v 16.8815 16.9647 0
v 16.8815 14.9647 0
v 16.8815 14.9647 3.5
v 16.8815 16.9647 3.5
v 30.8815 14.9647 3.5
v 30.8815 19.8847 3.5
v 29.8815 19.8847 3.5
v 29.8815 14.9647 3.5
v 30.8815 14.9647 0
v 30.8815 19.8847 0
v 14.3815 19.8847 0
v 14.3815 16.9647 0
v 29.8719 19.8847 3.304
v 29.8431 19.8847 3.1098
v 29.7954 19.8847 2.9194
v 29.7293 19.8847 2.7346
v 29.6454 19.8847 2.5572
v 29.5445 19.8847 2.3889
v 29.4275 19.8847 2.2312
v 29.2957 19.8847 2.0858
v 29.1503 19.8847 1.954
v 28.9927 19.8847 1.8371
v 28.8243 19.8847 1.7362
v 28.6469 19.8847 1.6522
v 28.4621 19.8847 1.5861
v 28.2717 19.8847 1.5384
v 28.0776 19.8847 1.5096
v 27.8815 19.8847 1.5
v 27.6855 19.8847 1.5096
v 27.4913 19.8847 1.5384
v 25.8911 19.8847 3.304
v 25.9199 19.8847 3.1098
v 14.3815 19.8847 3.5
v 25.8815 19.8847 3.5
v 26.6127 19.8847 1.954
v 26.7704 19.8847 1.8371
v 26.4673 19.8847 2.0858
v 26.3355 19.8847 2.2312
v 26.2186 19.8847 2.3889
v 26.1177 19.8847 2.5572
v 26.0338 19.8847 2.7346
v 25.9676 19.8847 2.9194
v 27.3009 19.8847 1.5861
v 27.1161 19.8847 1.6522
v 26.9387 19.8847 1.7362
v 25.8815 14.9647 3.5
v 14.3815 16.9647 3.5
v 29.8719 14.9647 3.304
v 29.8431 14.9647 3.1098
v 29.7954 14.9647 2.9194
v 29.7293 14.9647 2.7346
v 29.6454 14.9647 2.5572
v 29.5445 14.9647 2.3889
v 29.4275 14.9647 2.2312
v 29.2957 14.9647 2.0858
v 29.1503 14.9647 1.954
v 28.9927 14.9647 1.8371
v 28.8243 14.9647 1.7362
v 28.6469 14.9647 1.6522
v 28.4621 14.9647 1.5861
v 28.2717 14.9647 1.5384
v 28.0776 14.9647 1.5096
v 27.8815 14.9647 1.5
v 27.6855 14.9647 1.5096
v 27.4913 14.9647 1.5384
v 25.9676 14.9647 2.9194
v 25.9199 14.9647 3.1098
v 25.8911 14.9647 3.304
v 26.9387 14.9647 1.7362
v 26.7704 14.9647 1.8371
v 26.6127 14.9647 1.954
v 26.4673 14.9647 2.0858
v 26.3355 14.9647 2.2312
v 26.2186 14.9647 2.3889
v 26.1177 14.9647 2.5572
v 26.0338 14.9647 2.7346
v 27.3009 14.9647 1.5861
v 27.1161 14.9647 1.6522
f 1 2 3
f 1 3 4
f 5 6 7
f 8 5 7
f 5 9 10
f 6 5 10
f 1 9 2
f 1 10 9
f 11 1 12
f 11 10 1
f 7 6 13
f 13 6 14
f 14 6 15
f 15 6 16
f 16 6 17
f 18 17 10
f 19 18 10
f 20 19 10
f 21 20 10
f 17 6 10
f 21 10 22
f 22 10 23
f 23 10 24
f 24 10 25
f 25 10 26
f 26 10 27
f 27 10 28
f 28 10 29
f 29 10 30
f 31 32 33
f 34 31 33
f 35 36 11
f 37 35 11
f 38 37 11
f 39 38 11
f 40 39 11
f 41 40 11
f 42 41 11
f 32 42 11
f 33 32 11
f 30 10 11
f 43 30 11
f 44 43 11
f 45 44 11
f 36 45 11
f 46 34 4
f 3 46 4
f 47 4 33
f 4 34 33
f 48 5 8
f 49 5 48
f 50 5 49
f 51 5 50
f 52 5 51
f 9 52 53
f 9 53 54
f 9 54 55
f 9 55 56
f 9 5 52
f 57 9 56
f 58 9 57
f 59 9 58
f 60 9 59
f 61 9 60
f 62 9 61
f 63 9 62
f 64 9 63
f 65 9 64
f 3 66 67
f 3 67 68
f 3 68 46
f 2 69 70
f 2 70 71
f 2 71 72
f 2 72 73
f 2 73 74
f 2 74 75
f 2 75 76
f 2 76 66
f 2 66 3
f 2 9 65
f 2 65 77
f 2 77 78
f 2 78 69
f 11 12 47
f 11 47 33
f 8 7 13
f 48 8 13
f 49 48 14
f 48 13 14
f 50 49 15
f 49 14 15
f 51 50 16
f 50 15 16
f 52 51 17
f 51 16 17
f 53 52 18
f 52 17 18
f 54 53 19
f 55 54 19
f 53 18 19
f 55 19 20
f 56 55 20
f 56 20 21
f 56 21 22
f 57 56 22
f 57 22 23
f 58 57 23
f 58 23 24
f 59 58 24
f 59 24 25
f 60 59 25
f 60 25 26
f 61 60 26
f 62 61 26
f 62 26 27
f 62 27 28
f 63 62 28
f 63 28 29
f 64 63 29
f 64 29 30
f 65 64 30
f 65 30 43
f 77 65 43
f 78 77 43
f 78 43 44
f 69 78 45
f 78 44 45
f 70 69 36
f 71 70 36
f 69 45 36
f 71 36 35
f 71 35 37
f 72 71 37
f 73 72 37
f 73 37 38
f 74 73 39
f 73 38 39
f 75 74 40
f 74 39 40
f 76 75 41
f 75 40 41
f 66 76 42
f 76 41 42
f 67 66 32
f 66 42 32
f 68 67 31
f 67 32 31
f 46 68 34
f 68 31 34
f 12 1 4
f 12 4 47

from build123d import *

# Parameters (mm, degrees)
BOSS_EXTRUDE2_DEPTH = 3.5
CUT_EXTRUDE1_DEPTH  = 6


with BuildPart() as part:
    # Sketch4 → Boss-Extrude2 (new body)
    with BuildSketch(Plane.XY):
        Polygon((30.881516436, 14.964687786), (16.881516436, 14.964687786), (16.881516436, 16.964687786), (14.381516436, 16.964687786), (14.381516436, 19.884687786), (20.702643433, 19.884687786), (30.881516436, 19.884687786), (30.881516436, 16.964687786), align=None)
    extrude(amount=BOSS_EXTRUDE2_DEPTH)

    # Sketch5 → Cut-Extrude1 (cut)
    with BuildSketch(Plane(origin=(0, 19.884687786, 0), x_dir=(1, 0, 0), z_dir=(0, 1, 0))):
        with BuildLine():
            Line((27.881516436, -3.5), (29.881516436, -3.5))
            ThreePointArc((29.881516436, -3.5), (27.881516436, -1.5), (25.881516436, -3.5))
            Line((25.881516436, -3.5), (27.881516436, -3.5))
        make_face()
    extrude(amount=-CUT_EXTRUDE1_DEPTH, mode=Mode.SUBTRACT)


solid = part.part
